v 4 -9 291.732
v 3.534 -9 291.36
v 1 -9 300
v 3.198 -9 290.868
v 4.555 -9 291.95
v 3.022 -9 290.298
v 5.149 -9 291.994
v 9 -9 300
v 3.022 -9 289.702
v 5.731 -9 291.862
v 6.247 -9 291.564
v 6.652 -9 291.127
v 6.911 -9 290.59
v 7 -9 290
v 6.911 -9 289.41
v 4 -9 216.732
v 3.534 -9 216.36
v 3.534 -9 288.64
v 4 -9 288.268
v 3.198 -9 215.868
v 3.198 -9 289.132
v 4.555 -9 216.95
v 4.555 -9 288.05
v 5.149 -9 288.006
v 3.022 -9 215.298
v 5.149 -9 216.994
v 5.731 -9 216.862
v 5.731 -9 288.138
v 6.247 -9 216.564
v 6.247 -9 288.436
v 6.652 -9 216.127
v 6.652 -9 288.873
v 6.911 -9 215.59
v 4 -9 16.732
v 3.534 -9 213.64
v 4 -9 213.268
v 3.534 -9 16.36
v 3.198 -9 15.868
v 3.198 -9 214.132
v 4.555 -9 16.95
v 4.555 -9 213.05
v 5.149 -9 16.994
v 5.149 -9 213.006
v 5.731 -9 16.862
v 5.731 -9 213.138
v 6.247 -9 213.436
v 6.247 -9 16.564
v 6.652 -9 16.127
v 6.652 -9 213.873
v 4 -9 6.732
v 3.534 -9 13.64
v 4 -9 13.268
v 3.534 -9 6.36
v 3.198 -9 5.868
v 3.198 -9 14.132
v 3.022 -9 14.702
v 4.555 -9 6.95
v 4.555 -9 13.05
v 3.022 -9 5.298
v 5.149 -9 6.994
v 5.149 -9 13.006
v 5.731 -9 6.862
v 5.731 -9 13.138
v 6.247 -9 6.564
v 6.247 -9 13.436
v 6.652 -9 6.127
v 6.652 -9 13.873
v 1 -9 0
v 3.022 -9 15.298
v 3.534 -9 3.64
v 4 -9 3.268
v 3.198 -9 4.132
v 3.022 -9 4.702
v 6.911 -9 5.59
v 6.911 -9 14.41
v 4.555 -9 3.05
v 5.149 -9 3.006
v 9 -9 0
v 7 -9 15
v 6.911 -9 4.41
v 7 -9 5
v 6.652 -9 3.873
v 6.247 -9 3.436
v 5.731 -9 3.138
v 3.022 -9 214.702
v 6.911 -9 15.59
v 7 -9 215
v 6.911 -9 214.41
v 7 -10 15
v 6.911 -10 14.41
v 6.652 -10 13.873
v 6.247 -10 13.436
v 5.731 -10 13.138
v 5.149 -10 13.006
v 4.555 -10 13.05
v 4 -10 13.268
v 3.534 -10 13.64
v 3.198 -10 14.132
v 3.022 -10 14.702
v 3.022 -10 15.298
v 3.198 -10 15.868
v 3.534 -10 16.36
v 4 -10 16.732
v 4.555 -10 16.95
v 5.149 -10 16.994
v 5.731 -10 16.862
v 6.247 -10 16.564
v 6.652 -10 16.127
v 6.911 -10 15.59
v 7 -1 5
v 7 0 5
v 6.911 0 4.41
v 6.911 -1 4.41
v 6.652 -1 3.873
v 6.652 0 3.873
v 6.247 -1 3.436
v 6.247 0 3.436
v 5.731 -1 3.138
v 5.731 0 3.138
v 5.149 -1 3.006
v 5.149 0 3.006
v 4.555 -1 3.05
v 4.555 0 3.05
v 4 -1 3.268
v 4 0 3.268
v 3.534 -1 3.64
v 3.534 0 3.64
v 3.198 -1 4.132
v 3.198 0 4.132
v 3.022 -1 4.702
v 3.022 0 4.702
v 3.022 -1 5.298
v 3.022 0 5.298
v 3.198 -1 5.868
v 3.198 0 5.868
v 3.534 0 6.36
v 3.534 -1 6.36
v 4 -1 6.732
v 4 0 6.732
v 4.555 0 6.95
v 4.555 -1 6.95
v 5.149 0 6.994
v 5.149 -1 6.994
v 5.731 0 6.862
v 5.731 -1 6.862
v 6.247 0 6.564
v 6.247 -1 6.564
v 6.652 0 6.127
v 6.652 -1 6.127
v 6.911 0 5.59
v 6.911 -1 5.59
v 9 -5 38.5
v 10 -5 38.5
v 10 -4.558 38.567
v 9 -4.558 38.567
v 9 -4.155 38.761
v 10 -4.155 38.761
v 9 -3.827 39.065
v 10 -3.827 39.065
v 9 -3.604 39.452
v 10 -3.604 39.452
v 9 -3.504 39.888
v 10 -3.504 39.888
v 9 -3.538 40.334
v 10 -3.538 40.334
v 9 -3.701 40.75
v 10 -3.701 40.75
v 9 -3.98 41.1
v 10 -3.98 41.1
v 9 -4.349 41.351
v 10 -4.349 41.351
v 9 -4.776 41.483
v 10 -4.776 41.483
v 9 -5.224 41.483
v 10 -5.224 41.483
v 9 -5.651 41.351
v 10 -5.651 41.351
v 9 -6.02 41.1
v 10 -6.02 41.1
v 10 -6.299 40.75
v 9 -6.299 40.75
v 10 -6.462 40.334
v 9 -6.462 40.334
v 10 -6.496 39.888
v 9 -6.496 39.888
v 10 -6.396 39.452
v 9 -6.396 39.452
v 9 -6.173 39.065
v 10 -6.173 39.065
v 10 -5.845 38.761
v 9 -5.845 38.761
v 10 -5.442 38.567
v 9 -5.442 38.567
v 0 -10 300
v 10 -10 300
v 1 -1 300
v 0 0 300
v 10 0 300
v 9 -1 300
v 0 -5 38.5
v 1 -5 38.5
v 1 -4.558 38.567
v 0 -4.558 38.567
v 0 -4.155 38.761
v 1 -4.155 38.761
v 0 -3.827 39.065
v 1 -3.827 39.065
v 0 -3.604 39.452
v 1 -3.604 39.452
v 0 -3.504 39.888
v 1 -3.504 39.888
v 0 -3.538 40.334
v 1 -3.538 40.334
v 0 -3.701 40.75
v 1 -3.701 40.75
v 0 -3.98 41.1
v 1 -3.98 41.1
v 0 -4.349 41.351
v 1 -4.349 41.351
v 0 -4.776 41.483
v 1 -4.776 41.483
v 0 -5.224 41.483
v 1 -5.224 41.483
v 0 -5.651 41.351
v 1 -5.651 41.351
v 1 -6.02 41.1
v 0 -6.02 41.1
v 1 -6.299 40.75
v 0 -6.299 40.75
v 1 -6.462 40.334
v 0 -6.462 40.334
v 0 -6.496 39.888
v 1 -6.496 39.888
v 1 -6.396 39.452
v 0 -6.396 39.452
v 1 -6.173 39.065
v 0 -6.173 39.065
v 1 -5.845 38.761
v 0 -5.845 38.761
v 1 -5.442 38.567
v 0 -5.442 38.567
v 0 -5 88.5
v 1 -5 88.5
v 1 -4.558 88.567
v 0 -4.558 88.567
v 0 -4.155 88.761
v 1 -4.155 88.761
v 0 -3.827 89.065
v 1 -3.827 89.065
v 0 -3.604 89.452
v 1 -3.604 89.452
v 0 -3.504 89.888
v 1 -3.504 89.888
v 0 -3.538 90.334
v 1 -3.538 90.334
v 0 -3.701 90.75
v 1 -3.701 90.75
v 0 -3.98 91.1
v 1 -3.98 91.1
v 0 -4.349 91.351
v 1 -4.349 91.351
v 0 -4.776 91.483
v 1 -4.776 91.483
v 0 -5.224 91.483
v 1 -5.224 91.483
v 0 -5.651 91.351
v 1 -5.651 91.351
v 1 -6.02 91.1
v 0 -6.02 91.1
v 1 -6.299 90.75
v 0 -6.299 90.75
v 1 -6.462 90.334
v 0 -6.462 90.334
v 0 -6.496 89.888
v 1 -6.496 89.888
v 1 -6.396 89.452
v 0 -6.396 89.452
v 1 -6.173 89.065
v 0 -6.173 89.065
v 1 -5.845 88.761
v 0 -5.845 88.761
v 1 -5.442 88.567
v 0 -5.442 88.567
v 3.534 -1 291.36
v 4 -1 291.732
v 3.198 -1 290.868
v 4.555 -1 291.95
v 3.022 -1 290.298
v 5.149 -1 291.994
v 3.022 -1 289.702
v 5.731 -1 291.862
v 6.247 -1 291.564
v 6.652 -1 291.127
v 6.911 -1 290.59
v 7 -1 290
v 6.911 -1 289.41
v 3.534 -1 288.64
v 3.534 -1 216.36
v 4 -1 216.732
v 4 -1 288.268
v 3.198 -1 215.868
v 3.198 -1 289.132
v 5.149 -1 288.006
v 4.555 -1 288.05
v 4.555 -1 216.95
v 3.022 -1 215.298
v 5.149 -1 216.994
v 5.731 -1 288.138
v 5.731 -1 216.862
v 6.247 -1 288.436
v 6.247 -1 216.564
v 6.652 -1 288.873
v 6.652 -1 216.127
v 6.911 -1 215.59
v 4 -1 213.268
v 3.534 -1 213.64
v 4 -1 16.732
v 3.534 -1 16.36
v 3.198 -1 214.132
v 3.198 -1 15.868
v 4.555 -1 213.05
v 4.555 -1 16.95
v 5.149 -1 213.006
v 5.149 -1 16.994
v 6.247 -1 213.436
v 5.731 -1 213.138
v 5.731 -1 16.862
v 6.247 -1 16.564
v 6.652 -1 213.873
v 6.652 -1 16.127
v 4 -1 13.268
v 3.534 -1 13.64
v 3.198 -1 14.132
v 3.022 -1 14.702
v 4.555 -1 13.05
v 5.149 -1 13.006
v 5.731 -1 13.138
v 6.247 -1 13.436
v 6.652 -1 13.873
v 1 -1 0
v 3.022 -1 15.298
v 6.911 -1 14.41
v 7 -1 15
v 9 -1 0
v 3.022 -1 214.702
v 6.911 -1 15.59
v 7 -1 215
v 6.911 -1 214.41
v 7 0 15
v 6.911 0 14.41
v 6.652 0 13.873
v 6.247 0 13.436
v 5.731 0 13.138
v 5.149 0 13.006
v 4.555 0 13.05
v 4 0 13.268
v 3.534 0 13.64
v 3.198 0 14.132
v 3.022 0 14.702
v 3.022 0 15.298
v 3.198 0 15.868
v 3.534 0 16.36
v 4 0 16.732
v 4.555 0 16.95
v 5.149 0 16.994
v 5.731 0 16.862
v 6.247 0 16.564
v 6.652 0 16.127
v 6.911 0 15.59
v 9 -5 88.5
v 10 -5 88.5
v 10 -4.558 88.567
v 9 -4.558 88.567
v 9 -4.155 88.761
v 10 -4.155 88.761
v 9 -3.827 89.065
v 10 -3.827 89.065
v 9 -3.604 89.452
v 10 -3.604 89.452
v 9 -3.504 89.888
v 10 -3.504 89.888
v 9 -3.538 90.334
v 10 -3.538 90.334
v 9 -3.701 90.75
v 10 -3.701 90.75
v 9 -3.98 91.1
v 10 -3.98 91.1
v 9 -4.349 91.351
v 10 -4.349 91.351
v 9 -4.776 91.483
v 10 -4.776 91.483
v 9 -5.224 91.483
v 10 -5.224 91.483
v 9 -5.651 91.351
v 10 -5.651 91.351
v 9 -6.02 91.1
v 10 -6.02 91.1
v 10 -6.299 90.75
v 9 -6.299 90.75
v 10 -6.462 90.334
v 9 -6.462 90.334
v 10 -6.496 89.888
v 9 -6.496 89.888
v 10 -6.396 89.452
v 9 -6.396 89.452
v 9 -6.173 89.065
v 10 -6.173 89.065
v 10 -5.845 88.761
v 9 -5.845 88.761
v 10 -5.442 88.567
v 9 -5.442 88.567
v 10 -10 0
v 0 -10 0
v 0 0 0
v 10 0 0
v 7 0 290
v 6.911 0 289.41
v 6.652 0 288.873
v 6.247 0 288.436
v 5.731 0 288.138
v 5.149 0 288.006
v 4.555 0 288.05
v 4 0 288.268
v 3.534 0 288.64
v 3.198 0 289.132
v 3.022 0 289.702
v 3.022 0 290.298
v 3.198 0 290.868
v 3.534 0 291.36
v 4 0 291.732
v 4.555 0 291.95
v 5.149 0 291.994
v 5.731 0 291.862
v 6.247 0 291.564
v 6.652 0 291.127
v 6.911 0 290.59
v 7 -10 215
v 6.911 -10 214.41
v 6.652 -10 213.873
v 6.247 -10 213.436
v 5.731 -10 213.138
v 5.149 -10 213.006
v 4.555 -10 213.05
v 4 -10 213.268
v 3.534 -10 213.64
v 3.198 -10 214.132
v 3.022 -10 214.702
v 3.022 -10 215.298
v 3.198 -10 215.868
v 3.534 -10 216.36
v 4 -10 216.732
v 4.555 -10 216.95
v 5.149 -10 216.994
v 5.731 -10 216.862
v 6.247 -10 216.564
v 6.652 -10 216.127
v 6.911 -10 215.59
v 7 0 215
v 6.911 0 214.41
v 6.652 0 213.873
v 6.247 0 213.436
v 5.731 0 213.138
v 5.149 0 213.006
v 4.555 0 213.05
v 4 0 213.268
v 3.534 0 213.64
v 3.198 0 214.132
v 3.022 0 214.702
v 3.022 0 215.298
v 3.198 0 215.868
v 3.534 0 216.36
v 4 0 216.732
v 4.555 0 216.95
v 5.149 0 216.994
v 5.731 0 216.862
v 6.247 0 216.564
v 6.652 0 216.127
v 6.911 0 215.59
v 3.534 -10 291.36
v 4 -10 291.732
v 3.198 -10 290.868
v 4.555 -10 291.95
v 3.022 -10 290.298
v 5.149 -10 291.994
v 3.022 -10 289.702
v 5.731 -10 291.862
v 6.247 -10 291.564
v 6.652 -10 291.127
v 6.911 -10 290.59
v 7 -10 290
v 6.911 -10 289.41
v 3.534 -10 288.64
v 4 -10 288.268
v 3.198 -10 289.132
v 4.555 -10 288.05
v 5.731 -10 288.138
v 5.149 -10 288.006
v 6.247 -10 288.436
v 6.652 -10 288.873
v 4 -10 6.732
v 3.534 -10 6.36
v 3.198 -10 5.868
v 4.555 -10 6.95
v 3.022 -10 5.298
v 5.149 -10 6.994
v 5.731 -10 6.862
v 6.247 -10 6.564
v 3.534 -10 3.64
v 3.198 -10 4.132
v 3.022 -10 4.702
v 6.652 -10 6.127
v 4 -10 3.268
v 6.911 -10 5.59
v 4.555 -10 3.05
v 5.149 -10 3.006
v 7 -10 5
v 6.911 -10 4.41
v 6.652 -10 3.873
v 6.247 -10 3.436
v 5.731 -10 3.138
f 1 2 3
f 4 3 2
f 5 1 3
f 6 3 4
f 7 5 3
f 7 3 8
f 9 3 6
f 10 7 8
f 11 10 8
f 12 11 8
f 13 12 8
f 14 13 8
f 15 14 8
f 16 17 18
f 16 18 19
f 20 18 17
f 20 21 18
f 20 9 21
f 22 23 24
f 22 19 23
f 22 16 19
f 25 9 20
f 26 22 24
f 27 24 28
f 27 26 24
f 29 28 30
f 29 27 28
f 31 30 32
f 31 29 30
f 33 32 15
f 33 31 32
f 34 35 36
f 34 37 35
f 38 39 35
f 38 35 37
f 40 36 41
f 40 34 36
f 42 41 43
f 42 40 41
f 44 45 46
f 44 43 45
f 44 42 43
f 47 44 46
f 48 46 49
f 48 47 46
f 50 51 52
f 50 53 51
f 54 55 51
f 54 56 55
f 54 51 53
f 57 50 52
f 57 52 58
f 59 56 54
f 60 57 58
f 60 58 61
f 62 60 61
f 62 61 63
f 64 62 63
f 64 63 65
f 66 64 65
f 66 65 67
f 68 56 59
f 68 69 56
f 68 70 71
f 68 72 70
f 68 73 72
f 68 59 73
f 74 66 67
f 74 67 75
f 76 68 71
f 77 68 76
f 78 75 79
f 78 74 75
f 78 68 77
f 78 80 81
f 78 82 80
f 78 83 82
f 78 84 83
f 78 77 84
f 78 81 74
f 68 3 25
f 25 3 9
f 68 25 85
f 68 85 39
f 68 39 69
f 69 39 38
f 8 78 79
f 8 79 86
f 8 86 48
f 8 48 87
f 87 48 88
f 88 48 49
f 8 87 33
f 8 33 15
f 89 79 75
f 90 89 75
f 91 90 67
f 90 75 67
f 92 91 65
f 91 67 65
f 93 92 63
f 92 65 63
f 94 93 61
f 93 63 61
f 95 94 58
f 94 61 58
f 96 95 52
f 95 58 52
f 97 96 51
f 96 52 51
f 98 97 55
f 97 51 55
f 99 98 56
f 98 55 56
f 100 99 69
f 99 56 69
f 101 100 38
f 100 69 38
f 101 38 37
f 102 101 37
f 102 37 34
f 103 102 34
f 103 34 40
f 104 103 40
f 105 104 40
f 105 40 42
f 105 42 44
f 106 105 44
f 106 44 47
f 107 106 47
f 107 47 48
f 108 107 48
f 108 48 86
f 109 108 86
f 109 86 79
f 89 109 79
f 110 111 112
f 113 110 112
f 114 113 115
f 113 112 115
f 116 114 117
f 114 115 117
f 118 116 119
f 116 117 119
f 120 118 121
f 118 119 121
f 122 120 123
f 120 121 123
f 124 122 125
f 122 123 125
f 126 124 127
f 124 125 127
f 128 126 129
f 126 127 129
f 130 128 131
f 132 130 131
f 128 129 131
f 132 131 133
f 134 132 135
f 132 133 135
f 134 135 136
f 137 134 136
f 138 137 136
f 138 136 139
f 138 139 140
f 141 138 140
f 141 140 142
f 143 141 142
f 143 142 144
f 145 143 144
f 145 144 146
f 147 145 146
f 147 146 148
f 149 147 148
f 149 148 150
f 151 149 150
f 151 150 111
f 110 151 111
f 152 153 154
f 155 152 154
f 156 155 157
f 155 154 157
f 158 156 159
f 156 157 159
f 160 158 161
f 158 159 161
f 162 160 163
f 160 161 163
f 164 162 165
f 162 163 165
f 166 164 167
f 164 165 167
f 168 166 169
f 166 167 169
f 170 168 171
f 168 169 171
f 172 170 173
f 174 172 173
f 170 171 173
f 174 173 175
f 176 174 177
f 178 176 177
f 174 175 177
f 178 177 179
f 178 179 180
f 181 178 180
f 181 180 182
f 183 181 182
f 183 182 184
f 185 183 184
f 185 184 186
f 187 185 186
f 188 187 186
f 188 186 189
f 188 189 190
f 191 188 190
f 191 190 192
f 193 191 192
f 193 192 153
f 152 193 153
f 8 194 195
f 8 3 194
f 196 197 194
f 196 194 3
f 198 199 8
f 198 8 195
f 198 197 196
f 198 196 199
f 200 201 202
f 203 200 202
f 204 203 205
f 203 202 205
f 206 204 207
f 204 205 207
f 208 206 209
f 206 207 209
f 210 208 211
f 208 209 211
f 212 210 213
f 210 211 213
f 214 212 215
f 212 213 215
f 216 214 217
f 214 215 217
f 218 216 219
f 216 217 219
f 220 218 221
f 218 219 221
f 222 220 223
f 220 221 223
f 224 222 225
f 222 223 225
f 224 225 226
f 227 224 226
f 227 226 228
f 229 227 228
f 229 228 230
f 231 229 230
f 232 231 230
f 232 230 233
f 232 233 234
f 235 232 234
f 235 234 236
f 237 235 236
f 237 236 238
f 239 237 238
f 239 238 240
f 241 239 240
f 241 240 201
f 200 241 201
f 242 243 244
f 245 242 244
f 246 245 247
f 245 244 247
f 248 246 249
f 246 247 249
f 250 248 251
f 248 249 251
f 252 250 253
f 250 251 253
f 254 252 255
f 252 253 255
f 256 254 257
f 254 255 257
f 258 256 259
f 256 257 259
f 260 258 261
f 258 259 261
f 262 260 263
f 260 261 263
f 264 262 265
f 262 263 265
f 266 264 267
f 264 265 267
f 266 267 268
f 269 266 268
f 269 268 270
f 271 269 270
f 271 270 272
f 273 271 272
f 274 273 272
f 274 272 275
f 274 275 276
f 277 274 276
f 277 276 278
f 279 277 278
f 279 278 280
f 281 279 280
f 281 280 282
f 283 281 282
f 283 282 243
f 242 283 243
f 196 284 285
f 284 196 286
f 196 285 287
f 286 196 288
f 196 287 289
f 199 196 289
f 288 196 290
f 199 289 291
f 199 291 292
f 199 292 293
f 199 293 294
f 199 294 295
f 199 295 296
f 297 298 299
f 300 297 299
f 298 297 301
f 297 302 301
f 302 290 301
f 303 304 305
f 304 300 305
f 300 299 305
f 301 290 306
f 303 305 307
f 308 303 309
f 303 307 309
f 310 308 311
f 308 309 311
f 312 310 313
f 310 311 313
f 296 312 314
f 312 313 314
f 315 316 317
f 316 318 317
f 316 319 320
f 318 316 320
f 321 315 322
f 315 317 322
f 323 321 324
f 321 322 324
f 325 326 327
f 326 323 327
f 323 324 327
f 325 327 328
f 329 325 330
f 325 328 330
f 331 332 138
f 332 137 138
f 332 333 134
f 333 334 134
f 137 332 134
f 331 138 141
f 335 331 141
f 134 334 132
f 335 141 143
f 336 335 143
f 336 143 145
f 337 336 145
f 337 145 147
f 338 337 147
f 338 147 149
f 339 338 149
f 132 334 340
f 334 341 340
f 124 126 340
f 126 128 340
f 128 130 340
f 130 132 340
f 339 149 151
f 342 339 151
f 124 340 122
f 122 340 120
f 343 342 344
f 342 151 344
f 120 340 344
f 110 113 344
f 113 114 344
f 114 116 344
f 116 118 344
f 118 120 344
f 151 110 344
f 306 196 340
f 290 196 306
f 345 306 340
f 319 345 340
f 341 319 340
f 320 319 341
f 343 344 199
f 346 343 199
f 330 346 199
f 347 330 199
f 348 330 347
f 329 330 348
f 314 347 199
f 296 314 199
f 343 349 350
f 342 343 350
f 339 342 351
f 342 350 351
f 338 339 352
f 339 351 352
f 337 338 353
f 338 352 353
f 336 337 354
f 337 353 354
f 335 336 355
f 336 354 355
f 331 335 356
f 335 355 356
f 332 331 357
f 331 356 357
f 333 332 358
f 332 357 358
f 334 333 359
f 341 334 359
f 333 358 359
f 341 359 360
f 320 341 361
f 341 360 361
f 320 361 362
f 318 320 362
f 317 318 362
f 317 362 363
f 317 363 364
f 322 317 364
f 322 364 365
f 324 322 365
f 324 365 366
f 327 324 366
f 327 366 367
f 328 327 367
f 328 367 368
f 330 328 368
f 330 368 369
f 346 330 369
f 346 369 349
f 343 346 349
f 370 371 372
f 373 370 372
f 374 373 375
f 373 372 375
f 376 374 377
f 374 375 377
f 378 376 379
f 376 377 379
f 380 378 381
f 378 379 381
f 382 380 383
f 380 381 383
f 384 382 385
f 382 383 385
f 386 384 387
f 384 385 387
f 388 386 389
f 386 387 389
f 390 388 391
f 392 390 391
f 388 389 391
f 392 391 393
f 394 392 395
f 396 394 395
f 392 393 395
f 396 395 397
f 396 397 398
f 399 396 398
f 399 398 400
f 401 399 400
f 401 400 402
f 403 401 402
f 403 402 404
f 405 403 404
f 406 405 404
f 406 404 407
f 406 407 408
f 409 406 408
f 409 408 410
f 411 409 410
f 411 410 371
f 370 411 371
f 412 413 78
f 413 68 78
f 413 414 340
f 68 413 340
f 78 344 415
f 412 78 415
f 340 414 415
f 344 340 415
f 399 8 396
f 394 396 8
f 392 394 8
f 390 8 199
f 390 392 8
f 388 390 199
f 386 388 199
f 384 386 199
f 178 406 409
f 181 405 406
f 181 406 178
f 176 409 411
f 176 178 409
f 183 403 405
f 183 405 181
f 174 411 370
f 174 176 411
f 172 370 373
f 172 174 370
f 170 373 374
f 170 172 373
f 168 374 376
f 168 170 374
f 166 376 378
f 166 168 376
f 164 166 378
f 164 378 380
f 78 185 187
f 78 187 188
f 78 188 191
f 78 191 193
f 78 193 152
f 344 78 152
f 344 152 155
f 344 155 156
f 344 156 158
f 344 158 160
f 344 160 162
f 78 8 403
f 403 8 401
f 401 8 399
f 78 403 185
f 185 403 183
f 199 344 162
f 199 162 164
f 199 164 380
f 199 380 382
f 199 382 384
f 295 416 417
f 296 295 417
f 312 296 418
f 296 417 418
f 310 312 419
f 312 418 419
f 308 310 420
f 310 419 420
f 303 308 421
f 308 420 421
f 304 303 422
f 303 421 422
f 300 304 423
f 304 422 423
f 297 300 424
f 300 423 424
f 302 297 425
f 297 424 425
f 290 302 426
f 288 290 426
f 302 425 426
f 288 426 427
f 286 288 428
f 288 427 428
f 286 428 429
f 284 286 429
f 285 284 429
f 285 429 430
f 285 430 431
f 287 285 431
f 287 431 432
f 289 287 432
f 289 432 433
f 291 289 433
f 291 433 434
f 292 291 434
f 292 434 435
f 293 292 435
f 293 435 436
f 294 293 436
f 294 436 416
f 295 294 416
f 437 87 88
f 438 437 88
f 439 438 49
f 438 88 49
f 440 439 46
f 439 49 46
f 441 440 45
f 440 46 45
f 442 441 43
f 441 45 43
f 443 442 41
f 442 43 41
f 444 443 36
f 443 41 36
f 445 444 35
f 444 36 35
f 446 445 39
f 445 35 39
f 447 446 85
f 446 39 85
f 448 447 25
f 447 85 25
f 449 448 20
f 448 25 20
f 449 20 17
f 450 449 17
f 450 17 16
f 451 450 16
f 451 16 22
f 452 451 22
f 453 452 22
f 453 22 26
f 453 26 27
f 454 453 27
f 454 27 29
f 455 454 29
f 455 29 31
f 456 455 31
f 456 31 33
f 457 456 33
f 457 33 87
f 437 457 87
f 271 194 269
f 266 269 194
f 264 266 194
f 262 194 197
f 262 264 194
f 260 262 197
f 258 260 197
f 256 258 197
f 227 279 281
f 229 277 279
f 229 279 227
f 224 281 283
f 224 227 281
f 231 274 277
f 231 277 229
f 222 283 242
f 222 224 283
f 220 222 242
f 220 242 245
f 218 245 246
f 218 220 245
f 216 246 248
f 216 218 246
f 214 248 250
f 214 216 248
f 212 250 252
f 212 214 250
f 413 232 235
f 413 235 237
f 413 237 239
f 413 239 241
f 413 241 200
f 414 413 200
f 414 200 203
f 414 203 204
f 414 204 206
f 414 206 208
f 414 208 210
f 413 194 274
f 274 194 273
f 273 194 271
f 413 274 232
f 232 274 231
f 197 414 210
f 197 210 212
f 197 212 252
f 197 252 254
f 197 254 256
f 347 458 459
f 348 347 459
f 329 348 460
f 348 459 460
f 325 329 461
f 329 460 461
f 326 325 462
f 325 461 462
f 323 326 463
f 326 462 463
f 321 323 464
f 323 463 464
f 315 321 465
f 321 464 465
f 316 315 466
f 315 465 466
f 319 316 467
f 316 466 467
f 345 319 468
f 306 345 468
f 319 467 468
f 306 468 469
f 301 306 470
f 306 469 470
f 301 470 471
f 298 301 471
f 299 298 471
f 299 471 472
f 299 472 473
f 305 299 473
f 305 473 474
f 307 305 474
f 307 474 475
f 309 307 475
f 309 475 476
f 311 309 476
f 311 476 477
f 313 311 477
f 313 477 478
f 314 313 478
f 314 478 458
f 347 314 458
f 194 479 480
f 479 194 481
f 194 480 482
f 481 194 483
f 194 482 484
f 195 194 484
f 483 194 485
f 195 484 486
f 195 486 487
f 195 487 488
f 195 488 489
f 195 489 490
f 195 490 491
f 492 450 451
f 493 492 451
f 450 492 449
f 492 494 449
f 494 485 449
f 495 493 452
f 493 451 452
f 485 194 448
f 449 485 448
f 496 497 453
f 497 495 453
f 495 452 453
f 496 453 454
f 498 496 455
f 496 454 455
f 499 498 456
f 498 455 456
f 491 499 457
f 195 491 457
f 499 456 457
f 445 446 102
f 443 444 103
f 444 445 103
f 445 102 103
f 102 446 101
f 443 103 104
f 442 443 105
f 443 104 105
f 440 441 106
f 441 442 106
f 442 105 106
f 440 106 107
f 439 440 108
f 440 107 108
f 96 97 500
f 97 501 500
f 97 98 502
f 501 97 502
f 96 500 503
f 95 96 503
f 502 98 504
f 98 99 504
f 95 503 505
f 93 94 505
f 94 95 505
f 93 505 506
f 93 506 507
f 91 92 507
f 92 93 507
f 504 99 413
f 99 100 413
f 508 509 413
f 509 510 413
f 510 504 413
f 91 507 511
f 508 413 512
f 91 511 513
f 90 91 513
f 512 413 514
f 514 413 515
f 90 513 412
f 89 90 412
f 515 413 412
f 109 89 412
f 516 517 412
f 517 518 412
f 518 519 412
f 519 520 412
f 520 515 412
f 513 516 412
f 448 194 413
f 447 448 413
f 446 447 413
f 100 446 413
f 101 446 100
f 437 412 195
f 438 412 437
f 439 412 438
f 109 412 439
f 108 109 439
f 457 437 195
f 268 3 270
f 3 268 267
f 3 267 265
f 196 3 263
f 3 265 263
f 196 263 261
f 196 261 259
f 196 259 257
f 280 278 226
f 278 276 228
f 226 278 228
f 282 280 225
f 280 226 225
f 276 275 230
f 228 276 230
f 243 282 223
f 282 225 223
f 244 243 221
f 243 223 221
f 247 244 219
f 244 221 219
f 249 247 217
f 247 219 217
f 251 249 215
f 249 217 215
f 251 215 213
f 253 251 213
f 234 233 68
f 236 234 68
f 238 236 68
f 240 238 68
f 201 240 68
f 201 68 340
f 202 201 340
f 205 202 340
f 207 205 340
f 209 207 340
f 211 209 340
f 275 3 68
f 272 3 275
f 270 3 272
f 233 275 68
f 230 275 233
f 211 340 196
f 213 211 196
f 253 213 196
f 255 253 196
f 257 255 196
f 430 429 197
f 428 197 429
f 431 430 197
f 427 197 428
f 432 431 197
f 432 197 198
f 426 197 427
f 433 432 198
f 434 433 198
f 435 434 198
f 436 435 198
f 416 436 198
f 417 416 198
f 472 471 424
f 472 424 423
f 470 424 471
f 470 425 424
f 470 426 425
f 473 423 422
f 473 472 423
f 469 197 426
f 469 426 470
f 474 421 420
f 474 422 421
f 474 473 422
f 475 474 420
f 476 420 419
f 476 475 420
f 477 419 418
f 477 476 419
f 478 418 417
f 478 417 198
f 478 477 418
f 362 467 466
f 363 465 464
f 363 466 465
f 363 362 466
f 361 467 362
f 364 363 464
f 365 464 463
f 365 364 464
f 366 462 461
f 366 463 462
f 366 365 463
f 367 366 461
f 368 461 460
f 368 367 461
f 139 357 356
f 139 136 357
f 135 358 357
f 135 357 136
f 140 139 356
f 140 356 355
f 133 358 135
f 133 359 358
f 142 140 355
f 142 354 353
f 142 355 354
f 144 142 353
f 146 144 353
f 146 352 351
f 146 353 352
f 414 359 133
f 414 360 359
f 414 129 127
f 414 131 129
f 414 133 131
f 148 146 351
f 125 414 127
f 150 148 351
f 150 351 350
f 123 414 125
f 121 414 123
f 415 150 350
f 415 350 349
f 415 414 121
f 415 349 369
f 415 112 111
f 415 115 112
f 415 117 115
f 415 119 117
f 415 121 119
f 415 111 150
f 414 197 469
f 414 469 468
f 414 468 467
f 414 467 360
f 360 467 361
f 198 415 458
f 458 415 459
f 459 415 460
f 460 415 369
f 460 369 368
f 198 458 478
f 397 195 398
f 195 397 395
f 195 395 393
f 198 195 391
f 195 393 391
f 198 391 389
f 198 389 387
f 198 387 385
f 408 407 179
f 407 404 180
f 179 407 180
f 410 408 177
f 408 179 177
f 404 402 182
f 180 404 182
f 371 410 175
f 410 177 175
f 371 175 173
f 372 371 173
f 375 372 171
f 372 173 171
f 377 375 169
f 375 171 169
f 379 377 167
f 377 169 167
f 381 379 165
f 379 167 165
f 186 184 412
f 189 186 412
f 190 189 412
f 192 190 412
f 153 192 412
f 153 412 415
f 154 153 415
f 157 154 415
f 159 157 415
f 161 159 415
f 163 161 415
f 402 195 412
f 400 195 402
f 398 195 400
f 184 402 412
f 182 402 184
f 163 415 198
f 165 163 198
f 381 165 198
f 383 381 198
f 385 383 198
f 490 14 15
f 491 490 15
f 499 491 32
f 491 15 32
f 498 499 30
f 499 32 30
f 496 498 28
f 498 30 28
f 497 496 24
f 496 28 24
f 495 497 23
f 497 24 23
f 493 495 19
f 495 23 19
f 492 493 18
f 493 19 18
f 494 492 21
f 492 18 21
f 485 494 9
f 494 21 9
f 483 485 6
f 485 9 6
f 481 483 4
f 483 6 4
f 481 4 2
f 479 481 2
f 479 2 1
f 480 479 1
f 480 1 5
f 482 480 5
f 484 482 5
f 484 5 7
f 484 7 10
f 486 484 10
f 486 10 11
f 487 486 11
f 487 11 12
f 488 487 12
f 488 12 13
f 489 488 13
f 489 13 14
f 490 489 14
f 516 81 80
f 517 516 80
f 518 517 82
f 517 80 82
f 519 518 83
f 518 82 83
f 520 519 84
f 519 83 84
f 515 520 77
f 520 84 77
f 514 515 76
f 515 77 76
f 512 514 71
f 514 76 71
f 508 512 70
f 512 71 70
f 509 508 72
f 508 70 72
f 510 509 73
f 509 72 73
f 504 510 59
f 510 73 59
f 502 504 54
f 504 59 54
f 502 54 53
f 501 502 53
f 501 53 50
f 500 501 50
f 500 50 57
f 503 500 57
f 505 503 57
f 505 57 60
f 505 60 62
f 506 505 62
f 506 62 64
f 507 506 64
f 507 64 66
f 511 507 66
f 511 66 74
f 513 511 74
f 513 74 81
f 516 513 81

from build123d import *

# Parameters (mm, degrees)
SKETCH_1_W          = 10
SKETCH_1_H          = 10
SKETCH_1_W_2        = 8
SKETCH_1_H_2        = 8
EXTRUDE_1_DEPTH     = 300
SKETCH_2_R          = 2
CUT_EXTRUDE_1_DEPTH = 11
SKETCH_3_R          = 1.5
CUT_EXTRUDE_2_DEPTH = 11


with BuildPart() as part:
    # Эскиз1 → Бобышка-Вытянуть1 (new body)
    with BuildSketch(Plane.XY):
        with Locations((5, -5)):
            Rectangle(SKETCH_1_W, SKETCH_1_H)
        with Locations((5, -5)):
            Rectangle(SKETCH_1_W_2, SKETCH_1_H_2, mode=Mode.SUBTRACT)
    extrude(amount=EXTRUDE_1_DEPTH)

    # Эскиз2 → Вырез-Вытянуть1 (cut, through all)
    with BuildSketch(Plane(origin=(0, 0, 0), x_dir=(1, 0, 0), z_dir=(0, 1, 0))):
        with Locations((5, -5)):
            Circle(SKETCH_2_R)
        with Locations((5, -15)):
            Circle(SKETCH_2_R)
        with Locations((5, -290)):
            Circle(SKETCH_2_R)
        with Locations((5, -215)):
            Circle(SKETCH_2_R)
    extrude(amount=-CUT_EXTRUDE_1_DEPTH, mode=Mode.SUBTRACT)

    # Эскиз3 → Вырез-Вытянуть2 (cut, through all)
    with BuildSketch(Plane(origin=(10, 0, 0), x_dir=(0, 0, -1), z_dir=(1, 0, 0))):
        with Locations((-40, -5)):
            Circle(SKETCH_3_R)
        with Locations((-90, -5)):
            Circle(SKETCH_3_R)
    extrude(amount=-CUT_EXTRUDE_2_DEPTH, mode=Mode.SUBTRACT)


solid = part.part
